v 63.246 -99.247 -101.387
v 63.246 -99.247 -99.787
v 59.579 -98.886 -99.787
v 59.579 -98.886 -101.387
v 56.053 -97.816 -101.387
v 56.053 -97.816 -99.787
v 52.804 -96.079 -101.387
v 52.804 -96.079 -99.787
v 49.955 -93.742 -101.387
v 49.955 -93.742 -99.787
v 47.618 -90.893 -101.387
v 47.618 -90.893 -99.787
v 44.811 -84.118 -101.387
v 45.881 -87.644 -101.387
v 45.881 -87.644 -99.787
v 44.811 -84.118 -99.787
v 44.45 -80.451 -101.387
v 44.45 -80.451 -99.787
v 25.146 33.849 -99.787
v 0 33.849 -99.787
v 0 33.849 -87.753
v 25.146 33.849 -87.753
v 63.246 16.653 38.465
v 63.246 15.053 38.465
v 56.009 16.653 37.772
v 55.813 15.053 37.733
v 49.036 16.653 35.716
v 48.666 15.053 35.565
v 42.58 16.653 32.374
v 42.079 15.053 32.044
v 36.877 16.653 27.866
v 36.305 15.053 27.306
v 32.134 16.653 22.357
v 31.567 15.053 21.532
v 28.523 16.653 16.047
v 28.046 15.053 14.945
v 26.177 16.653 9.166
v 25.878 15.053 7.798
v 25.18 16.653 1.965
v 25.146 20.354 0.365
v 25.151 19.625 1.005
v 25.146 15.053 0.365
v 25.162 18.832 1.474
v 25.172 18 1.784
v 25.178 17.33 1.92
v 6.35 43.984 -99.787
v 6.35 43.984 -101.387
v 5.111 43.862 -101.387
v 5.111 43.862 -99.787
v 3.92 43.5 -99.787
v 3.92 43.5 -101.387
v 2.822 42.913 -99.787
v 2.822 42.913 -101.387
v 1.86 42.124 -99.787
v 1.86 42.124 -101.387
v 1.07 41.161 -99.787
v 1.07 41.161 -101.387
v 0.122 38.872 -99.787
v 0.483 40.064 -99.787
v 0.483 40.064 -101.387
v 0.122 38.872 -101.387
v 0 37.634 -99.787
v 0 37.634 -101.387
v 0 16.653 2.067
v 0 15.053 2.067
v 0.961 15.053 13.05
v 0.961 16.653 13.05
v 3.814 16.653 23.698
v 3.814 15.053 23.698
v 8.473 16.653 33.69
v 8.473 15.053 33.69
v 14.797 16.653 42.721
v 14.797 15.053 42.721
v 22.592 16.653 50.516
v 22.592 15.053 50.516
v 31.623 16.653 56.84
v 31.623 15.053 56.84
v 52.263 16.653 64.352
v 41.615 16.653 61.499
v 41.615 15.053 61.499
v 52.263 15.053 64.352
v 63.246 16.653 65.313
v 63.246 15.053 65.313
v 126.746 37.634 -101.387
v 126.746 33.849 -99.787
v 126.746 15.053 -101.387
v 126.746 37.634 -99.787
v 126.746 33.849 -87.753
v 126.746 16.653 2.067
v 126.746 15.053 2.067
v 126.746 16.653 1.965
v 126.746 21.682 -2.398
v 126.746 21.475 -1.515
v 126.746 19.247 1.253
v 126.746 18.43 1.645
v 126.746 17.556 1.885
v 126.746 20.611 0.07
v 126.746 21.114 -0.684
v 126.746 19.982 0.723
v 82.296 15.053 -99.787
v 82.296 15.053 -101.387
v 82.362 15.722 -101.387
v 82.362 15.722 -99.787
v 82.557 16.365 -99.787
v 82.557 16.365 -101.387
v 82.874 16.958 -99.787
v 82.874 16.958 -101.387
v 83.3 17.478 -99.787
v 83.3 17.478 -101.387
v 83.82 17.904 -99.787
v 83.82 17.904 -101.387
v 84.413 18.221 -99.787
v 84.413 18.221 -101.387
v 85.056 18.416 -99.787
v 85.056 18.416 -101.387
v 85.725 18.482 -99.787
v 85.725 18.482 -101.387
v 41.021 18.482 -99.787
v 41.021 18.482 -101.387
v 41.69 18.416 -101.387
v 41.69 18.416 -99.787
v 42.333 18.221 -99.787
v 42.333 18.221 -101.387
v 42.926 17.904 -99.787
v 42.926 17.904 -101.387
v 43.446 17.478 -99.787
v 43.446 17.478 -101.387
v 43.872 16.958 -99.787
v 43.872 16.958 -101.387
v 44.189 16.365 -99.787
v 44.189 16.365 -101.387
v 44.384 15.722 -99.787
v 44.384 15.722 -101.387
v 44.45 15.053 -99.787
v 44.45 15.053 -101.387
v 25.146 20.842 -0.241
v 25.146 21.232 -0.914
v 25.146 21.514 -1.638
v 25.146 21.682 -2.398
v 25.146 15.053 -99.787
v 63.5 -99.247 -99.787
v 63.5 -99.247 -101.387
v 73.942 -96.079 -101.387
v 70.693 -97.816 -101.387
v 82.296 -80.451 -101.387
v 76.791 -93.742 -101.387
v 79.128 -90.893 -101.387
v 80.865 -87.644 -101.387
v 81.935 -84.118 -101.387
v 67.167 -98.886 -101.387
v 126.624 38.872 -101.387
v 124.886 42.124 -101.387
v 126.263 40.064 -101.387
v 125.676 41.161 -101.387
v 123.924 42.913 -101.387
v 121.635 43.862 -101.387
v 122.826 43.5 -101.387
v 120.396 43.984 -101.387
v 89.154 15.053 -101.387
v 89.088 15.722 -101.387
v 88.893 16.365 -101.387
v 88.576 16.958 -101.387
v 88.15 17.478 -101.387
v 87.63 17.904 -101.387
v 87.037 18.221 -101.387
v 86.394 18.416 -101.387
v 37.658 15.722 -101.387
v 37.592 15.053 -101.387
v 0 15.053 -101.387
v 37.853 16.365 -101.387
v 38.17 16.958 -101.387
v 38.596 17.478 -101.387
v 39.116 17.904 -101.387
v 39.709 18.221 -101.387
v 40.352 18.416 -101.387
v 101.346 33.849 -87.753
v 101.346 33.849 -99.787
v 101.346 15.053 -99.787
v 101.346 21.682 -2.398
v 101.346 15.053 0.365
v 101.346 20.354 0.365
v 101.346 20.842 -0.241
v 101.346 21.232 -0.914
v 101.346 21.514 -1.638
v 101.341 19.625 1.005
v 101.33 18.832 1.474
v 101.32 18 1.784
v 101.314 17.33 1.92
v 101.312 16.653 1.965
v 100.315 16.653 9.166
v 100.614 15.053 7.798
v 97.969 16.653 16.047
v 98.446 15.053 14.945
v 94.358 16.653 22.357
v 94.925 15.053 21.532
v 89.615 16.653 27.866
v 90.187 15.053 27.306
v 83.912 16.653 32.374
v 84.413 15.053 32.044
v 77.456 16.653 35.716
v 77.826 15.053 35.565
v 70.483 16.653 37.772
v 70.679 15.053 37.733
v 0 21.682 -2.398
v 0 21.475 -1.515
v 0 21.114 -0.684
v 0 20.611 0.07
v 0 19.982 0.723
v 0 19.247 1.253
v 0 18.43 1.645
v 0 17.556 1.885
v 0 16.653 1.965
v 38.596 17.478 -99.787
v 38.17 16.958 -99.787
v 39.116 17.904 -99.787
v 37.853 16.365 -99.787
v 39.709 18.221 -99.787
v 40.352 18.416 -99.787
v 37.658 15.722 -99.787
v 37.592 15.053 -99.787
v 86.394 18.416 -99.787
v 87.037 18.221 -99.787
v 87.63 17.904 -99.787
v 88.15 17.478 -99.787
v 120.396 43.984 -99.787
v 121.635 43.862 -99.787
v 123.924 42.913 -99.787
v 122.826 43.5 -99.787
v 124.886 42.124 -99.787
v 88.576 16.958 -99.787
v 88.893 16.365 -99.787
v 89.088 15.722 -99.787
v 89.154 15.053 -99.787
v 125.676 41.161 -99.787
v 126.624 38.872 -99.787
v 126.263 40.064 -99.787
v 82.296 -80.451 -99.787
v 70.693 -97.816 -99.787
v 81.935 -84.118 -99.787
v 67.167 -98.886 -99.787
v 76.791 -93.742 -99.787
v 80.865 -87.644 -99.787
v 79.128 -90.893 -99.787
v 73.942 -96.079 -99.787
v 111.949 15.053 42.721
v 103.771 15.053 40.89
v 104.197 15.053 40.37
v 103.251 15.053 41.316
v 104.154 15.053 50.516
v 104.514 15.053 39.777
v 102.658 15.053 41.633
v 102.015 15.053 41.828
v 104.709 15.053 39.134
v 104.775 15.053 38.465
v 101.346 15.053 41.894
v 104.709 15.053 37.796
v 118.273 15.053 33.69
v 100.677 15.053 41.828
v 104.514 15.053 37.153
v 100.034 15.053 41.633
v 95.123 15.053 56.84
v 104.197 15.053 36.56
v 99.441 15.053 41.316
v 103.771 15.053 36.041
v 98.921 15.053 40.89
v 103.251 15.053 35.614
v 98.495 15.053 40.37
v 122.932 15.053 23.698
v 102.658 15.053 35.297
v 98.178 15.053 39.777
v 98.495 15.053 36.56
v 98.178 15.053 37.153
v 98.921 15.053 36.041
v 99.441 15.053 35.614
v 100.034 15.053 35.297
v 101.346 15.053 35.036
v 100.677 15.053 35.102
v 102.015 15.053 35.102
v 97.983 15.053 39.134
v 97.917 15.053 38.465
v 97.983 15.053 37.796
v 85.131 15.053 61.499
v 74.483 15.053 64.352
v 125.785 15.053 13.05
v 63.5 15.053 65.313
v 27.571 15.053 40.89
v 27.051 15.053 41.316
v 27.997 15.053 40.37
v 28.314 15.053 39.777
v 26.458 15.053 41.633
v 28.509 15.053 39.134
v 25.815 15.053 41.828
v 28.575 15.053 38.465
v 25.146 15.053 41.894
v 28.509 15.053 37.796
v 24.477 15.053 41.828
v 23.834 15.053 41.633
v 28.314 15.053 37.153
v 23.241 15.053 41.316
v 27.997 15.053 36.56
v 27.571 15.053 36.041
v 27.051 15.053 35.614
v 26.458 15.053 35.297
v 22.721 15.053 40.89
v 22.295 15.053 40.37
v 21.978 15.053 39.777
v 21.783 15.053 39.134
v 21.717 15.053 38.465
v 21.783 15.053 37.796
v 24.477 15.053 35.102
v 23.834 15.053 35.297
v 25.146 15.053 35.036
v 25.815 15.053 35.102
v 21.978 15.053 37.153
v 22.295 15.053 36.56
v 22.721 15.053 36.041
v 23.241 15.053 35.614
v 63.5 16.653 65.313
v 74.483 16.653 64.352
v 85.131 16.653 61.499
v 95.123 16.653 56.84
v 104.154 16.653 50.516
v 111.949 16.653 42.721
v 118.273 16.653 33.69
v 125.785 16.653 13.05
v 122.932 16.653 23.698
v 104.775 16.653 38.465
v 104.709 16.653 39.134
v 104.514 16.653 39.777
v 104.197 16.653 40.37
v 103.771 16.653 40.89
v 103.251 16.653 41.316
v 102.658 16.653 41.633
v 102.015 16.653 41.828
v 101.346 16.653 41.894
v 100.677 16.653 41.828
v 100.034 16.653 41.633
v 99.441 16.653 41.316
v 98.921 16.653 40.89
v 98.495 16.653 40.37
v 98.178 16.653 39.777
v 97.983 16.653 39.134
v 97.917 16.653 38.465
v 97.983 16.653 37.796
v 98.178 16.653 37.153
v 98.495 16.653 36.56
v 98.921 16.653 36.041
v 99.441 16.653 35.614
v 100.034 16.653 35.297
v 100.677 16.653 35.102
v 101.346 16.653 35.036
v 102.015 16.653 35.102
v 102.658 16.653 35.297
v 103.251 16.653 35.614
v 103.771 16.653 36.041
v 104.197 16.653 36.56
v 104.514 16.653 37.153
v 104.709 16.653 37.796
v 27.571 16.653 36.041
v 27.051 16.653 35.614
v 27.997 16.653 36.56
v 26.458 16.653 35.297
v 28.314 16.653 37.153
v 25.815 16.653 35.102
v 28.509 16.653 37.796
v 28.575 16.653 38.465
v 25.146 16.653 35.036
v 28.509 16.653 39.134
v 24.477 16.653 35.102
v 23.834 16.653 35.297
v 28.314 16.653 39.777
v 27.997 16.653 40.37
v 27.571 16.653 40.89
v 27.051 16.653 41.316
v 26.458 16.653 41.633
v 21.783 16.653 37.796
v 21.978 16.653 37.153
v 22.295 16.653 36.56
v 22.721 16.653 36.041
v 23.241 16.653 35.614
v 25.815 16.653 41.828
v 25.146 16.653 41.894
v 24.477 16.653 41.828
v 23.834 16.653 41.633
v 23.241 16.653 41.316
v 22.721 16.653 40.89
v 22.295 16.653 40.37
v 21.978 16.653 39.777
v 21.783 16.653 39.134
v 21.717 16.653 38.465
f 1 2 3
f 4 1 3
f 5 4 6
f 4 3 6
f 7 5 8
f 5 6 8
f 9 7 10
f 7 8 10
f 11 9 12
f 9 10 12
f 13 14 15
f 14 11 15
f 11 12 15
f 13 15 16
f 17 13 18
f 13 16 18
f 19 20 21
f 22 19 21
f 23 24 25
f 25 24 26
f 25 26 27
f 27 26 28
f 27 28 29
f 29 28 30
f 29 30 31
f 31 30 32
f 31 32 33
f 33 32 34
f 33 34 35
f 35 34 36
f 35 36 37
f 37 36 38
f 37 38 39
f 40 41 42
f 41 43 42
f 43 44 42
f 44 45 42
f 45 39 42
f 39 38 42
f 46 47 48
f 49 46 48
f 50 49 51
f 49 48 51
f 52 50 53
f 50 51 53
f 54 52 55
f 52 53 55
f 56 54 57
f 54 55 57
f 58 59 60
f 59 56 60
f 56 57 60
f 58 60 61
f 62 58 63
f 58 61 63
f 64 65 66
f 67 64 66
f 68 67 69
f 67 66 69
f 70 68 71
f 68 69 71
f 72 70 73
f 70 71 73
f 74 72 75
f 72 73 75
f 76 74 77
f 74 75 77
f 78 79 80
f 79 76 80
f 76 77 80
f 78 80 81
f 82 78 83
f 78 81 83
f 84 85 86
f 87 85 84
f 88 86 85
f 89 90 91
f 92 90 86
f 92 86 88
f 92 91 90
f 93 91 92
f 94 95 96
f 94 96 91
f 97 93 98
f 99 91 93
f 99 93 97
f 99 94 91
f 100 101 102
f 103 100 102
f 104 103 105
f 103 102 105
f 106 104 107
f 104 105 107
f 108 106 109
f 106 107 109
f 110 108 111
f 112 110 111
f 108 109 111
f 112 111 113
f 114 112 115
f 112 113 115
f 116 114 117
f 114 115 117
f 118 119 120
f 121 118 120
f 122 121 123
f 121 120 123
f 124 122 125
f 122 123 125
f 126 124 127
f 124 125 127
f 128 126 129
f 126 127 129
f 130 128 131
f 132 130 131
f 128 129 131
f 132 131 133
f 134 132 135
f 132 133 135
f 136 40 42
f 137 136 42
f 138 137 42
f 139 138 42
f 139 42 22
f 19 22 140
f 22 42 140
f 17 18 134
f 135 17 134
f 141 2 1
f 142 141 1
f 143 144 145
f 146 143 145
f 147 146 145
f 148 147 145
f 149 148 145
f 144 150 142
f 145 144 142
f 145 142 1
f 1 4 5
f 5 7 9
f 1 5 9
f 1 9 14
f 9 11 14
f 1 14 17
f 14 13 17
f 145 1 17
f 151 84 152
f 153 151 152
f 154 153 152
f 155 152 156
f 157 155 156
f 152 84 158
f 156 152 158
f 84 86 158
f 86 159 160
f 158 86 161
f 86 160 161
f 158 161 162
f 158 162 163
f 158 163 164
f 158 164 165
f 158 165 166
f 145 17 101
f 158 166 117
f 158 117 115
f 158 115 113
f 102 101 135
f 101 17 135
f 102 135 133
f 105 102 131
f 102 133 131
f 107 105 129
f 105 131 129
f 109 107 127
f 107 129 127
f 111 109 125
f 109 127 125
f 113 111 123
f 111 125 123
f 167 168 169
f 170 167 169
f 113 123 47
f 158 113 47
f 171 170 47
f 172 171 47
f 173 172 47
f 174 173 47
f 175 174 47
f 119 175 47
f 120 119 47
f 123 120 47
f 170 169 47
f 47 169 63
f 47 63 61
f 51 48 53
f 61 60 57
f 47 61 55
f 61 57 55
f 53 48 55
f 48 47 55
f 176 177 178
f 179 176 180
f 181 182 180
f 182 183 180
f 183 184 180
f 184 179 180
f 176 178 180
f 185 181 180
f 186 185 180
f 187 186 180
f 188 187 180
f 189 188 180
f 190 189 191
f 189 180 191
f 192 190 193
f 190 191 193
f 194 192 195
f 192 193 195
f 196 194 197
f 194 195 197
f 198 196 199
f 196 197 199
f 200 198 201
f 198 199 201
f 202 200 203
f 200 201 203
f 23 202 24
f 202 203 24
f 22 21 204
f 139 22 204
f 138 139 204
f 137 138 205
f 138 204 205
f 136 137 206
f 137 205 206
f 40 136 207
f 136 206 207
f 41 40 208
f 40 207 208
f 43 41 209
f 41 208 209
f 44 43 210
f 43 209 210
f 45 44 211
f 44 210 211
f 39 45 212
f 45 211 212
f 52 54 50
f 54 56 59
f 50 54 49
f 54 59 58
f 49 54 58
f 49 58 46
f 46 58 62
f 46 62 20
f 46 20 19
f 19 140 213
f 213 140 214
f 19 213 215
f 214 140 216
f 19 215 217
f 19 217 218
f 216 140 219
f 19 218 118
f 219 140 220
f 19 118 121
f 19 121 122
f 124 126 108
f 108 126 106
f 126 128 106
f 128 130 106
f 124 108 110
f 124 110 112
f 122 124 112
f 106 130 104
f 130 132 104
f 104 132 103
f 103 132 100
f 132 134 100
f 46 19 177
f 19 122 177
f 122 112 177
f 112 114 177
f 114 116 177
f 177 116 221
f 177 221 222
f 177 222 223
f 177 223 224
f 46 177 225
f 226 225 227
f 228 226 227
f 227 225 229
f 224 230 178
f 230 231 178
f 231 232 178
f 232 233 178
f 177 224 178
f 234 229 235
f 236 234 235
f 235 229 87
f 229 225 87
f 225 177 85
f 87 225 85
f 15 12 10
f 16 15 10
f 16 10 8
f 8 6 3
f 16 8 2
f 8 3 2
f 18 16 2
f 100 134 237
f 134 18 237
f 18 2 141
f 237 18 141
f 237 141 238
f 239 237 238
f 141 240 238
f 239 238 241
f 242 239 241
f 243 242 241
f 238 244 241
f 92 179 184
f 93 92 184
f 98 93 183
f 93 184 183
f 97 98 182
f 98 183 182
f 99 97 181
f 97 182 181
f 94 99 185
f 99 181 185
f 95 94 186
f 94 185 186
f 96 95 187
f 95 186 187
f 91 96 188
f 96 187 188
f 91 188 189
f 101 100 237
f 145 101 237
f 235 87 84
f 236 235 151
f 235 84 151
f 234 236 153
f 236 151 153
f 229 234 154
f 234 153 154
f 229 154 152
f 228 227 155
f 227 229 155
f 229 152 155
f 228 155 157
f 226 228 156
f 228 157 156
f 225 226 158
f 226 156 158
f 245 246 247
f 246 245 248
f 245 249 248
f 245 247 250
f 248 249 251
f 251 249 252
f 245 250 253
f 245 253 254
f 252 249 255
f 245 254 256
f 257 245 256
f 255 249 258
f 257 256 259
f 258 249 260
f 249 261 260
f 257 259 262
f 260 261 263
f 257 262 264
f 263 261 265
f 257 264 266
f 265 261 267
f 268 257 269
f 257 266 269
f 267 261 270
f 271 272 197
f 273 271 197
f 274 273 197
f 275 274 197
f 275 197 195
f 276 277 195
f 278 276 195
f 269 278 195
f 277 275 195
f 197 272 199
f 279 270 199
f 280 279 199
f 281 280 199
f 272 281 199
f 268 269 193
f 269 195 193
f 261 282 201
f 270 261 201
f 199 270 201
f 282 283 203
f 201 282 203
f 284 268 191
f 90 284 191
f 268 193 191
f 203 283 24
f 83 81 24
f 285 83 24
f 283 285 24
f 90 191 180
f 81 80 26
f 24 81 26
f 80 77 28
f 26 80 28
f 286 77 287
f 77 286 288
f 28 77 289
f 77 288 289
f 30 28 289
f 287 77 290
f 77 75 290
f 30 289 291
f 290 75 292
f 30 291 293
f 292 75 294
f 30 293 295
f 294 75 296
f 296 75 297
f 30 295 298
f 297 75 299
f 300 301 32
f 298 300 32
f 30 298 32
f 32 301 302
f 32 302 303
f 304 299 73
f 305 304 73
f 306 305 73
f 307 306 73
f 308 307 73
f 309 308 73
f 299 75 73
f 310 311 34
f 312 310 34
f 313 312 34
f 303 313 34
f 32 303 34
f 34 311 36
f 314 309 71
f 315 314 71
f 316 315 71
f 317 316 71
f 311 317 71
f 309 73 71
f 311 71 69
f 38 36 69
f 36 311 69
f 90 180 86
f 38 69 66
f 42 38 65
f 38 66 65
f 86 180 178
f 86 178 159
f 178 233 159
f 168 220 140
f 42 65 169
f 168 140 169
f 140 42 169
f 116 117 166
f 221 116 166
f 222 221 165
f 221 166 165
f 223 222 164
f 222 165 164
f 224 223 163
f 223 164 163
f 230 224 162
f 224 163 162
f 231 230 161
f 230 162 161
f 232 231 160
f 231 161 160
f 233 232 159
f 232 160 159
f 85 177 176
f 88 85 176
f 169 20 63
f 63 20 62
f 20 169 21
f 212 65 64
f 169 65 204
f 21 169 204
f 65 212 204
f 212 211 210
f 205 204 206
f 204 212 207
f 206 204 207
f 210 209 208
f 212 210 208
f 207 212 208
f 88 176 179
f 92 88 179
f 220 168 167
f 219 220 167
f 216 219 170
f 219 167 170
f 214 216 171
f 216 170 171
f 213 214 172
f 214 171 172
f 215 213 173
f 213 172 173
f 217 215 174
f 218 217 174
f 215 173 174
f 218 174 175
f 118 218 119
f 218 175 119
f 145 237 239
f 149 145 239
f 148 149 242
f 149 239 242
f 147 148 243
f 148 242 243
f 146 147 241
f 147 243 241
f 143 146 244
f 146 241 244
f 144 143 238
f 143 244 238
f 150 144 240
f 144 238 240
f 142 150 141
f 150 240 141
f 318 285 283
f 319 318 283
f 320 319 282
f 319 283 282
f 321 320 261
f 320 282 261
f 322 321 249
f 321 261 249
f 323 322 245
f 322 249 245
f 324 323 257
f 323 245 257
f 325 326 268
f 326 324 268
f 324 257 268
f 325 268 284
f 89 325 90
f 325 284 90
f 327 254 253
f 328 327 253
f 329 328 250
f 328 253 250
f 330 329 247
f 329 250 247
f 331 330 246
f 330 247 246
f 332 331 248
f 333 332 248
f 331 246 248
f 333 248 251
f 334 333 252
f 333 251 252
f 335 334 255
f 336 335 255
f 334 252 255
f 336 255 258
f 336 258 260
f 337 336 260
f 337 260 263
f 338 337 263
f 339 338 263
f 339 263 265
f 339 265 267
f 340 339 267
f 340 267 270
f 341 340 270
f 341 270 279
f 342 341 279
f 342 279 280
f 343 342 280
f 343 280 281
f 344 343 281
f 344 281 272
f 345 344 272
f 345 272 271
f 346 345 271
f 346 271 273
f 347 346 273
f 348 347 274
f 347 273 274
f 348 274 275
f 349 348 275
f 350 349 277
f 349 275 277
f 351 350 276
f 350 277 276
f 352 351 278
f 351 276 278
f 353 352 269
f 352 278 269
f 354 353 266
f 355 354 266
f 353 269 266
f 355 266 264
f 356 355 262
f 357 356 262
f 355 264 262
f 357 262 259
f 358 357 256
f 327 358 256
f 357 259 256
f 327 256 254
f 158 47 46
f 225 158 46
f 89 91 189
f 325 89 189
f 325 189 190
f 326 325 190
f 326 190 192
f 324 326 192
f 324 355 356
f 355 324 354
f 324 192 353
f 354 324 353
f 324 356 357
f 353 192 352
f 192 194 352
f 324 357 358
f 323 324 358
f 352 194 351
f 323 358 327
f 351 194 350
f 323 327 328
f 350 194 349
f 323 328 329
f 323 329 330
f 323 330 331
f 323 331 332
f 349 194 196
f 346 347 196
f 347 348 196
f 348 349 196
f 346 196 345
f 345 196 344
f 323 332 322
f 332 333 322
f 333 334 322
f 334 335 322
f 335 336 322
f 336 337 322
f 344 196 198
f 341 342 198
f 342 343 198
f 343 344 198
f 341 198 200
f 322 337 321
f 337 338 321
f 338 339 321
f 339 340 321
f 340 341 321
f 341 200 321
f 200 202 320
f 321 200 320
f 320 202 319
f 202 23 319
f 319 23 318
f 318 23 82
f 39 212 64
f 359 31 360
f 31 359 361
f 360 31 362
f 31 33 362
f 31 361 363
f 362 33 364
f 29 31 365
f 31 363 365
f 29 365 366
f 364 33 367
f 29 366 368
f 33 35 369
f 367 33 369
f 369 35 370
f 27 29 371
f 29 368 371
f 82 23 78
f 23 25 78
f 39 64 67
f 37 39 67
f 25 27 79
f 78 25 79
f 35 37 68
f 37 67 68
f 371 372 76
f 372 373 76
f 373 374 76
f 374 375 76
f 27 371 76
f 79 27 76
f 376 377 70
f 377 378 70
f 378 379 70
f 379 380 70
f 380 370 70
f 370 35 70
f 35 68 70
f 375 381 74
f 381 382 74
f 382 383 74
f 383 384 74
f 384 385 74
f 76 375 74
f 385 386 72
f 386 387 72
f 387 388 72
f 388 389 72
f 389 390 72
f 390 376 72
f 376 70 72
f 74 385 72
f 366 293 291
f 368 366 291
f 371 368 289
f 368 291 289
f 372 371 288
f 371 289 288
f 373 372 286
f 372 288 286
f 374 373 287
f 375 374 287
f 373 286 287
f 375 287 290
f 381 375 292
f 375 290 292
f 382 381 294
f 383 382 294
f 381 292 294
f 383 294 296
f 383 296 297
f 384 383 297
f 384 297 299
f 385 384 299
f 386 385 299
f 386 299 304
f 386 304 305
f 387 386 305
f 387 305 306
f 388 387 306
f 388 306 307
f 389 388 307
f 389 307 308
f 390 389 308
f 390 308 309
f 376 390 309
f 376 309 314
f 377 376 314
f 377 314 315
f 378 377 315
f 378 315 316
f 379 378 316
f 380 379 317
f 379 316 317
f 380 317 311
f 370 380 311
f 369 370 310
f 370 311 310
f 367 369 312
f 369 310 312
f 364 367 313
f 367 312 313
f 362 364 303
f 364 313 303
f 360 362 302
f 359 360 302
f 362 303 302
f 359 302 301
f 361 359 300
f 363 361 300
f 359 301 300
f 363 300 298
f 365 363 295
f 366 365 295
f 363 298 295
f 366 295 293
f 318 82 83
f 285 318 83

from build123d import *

# Parameters (mm, degrees)
F1_DEPTH = 126.746
F3_DEPTH = 1.6012
F4_R     = 3.429
F5_DEPTH = 28.9316
F7_DEPTH = 25.4


with BuildPart() as f1:
    # F0 (on Right) → F1 (new body)
    with BuildSketch(Plane.YZ):
        with BuildLine():
            Line((16.653205, 65.313007), (15.053005, 65.313007))
            Line((15.053005, 65.313007), (15.053005, -19.597488))
            Line((15.053005, -19.597488), (15.053005, -99.786993))
            Line((15.053005, -99.786993), (-99.246995, -99.786993))
            Line((-99.246995, -99.786993), (-99.246995, -101.387193))
            Line((-99.246995, -101.387193), (43.983605, -101.387193))
            Line((43.983605, -101.387193), (43.983605, -99.786993))
            Line((43.983605, -99.786993), (33.849005, -99.786993))
            Line((33.849005, -99.786993), (33.849005, -87.752856))
            Line((33.849005, -87.752856), (21.68237, -2.397729))
            ThreePointArc((21.68237, -2.397729), (19.982223, 0.722598), (16.653205, 1.965407))
            Line((16.653205, 1.965407), (16.653205, 65.313007))
        make_face()
    extrude(amount=F1_DEPTH)

    # F2 (on face) → F3 (cut, through all)
    with BuildSketch(Plane.XY.offset(-99.786993)):
        with BuildLine():
            Line((0, -99.246995), (63.246, -99.246995))
            ThreePointArc((63.246, -99.246995), (49.955221, -93.741774), (44.45, -80.450995))
            Line((44.45, -80.450995), (44.45, 15.053005))
            Line((44.45, 15.053005), (0, 15.053005))
            Line((0, 15.053005), (0, -99.246995))
        make_face()
        with BuildLine():
            ThreePointArc((82.296, -80.450995), (76.790779, -93.741774), (63.5, -99.246995))
            Line((63.5, -99.246995), (126.746, -99.246995))
            Line((126.746, -99.246995), (126.746, 15.053005))
            Line((126.746, 15.053005), (82.296, 15.053005))
            Line((82.296, 15.053005), (82.296, -80.450995))
        make_face()
    extrude(amount=-F3_DEPTH, mode=Mode.SUBTRACT)

    # F4 (on face) → F5 (cut, through all)
    with BuildSketch(Plane.XZ.offset(-15.053005)):
        with BuildLine():
            Line((0, 65.313007), (0, 2.067007))
            ThreePointArc((0, 2.067007), (18.524325, 46.788682), (63.246, 65.313007))
            Line((63.246, 65.313007), (0, 65.313007))
        make_face()
        with BuildLine():
            Line((126.746, 65.313007), (63.5, 65.313007))
            ThreePointArc((63.5, 65.313007), (108.221675, 46.788682), (126.746, 2.067007))
            Line((126.746, 2.067007), (126.746, 65.313007))
        make_face()
        with BuildLine():
            Line((25.146, 0.365207), (25.146, -99.786993))
            Line((25.146, -99.786993), (44.45, -99.786993))
            Line((44.45, -99.786993), (82.296, -99.786993))
            Line((82.296, -99.786993), (101.346, -99.786993))
            Line((101.346, -99.786993), (101.346, 0.365207))
            ThreePointArc((101.346, 0.365207), (90.186768, 27.305975), (63.246, 38.465207))
            ThreePointArc((63.246, 38.465207), (36.305232, 27.305975), (25.146, 0.365207))
        make_face()
        with Locations((25.146, 38.465207)):
            Circle(F4_R)
        with Locations((101.346, 38.465207)):
            Circle(F4_R)
    extrude(amount=-F5_DEPTH, mode=Mode.SUBTRACT)

    # F6 (on face) → F7 (cut)
    with BuildSketch(Plane(origin=(0, 0, -101.387193), x_dir=(1, 0, 0), z_dir=(0, 0, -1))):
        with BuildLine():
            ThreePointArc((6.35, -43.983605), (1.859872, -42.123733), (0, -37.633605))
            Line((0, -37.633605), (0, -43.983605))
            Line((0, -43.983605), (6.35, -43.983605))
        make_face()
        with BuildLine():
            ThreePointArc((37.592, -15.053005), (38.596331, -17.477674), (41.021, -18.482005))
            ThreePointArc((41.021, -18.482005), (43.445669, -17.477674), (44.45, -15.053005))
            Line((44.45, -15.053005), (37.592, -15.053005))
        make_face()
        with BuildLine():
            Line((89.154, -15.053005), (82.296, -15.053005))
            ThreePointArc((82.296, -15.053005), (83.300331, -17.477674), (85.725, -18.482005))
            ThreePointArc((85.725, -18.482005), (88.149669, -17.477674), (89.154, -15.053005))
        make_face()
        with BuildLine():
            ThreePointArc((126.746, -37.633605), (124.886128, -42.123733), (120.396, -43.983605))
            Line((120.396, -43.983605), (126.746, -43.983605))
            Line((126.746, -43.983605), (126.746, -37.633605))
        make_face()
    extrude(amount=-F7_DEPTH, mode=Mode.SUBTRACT)


solid = f1.part
